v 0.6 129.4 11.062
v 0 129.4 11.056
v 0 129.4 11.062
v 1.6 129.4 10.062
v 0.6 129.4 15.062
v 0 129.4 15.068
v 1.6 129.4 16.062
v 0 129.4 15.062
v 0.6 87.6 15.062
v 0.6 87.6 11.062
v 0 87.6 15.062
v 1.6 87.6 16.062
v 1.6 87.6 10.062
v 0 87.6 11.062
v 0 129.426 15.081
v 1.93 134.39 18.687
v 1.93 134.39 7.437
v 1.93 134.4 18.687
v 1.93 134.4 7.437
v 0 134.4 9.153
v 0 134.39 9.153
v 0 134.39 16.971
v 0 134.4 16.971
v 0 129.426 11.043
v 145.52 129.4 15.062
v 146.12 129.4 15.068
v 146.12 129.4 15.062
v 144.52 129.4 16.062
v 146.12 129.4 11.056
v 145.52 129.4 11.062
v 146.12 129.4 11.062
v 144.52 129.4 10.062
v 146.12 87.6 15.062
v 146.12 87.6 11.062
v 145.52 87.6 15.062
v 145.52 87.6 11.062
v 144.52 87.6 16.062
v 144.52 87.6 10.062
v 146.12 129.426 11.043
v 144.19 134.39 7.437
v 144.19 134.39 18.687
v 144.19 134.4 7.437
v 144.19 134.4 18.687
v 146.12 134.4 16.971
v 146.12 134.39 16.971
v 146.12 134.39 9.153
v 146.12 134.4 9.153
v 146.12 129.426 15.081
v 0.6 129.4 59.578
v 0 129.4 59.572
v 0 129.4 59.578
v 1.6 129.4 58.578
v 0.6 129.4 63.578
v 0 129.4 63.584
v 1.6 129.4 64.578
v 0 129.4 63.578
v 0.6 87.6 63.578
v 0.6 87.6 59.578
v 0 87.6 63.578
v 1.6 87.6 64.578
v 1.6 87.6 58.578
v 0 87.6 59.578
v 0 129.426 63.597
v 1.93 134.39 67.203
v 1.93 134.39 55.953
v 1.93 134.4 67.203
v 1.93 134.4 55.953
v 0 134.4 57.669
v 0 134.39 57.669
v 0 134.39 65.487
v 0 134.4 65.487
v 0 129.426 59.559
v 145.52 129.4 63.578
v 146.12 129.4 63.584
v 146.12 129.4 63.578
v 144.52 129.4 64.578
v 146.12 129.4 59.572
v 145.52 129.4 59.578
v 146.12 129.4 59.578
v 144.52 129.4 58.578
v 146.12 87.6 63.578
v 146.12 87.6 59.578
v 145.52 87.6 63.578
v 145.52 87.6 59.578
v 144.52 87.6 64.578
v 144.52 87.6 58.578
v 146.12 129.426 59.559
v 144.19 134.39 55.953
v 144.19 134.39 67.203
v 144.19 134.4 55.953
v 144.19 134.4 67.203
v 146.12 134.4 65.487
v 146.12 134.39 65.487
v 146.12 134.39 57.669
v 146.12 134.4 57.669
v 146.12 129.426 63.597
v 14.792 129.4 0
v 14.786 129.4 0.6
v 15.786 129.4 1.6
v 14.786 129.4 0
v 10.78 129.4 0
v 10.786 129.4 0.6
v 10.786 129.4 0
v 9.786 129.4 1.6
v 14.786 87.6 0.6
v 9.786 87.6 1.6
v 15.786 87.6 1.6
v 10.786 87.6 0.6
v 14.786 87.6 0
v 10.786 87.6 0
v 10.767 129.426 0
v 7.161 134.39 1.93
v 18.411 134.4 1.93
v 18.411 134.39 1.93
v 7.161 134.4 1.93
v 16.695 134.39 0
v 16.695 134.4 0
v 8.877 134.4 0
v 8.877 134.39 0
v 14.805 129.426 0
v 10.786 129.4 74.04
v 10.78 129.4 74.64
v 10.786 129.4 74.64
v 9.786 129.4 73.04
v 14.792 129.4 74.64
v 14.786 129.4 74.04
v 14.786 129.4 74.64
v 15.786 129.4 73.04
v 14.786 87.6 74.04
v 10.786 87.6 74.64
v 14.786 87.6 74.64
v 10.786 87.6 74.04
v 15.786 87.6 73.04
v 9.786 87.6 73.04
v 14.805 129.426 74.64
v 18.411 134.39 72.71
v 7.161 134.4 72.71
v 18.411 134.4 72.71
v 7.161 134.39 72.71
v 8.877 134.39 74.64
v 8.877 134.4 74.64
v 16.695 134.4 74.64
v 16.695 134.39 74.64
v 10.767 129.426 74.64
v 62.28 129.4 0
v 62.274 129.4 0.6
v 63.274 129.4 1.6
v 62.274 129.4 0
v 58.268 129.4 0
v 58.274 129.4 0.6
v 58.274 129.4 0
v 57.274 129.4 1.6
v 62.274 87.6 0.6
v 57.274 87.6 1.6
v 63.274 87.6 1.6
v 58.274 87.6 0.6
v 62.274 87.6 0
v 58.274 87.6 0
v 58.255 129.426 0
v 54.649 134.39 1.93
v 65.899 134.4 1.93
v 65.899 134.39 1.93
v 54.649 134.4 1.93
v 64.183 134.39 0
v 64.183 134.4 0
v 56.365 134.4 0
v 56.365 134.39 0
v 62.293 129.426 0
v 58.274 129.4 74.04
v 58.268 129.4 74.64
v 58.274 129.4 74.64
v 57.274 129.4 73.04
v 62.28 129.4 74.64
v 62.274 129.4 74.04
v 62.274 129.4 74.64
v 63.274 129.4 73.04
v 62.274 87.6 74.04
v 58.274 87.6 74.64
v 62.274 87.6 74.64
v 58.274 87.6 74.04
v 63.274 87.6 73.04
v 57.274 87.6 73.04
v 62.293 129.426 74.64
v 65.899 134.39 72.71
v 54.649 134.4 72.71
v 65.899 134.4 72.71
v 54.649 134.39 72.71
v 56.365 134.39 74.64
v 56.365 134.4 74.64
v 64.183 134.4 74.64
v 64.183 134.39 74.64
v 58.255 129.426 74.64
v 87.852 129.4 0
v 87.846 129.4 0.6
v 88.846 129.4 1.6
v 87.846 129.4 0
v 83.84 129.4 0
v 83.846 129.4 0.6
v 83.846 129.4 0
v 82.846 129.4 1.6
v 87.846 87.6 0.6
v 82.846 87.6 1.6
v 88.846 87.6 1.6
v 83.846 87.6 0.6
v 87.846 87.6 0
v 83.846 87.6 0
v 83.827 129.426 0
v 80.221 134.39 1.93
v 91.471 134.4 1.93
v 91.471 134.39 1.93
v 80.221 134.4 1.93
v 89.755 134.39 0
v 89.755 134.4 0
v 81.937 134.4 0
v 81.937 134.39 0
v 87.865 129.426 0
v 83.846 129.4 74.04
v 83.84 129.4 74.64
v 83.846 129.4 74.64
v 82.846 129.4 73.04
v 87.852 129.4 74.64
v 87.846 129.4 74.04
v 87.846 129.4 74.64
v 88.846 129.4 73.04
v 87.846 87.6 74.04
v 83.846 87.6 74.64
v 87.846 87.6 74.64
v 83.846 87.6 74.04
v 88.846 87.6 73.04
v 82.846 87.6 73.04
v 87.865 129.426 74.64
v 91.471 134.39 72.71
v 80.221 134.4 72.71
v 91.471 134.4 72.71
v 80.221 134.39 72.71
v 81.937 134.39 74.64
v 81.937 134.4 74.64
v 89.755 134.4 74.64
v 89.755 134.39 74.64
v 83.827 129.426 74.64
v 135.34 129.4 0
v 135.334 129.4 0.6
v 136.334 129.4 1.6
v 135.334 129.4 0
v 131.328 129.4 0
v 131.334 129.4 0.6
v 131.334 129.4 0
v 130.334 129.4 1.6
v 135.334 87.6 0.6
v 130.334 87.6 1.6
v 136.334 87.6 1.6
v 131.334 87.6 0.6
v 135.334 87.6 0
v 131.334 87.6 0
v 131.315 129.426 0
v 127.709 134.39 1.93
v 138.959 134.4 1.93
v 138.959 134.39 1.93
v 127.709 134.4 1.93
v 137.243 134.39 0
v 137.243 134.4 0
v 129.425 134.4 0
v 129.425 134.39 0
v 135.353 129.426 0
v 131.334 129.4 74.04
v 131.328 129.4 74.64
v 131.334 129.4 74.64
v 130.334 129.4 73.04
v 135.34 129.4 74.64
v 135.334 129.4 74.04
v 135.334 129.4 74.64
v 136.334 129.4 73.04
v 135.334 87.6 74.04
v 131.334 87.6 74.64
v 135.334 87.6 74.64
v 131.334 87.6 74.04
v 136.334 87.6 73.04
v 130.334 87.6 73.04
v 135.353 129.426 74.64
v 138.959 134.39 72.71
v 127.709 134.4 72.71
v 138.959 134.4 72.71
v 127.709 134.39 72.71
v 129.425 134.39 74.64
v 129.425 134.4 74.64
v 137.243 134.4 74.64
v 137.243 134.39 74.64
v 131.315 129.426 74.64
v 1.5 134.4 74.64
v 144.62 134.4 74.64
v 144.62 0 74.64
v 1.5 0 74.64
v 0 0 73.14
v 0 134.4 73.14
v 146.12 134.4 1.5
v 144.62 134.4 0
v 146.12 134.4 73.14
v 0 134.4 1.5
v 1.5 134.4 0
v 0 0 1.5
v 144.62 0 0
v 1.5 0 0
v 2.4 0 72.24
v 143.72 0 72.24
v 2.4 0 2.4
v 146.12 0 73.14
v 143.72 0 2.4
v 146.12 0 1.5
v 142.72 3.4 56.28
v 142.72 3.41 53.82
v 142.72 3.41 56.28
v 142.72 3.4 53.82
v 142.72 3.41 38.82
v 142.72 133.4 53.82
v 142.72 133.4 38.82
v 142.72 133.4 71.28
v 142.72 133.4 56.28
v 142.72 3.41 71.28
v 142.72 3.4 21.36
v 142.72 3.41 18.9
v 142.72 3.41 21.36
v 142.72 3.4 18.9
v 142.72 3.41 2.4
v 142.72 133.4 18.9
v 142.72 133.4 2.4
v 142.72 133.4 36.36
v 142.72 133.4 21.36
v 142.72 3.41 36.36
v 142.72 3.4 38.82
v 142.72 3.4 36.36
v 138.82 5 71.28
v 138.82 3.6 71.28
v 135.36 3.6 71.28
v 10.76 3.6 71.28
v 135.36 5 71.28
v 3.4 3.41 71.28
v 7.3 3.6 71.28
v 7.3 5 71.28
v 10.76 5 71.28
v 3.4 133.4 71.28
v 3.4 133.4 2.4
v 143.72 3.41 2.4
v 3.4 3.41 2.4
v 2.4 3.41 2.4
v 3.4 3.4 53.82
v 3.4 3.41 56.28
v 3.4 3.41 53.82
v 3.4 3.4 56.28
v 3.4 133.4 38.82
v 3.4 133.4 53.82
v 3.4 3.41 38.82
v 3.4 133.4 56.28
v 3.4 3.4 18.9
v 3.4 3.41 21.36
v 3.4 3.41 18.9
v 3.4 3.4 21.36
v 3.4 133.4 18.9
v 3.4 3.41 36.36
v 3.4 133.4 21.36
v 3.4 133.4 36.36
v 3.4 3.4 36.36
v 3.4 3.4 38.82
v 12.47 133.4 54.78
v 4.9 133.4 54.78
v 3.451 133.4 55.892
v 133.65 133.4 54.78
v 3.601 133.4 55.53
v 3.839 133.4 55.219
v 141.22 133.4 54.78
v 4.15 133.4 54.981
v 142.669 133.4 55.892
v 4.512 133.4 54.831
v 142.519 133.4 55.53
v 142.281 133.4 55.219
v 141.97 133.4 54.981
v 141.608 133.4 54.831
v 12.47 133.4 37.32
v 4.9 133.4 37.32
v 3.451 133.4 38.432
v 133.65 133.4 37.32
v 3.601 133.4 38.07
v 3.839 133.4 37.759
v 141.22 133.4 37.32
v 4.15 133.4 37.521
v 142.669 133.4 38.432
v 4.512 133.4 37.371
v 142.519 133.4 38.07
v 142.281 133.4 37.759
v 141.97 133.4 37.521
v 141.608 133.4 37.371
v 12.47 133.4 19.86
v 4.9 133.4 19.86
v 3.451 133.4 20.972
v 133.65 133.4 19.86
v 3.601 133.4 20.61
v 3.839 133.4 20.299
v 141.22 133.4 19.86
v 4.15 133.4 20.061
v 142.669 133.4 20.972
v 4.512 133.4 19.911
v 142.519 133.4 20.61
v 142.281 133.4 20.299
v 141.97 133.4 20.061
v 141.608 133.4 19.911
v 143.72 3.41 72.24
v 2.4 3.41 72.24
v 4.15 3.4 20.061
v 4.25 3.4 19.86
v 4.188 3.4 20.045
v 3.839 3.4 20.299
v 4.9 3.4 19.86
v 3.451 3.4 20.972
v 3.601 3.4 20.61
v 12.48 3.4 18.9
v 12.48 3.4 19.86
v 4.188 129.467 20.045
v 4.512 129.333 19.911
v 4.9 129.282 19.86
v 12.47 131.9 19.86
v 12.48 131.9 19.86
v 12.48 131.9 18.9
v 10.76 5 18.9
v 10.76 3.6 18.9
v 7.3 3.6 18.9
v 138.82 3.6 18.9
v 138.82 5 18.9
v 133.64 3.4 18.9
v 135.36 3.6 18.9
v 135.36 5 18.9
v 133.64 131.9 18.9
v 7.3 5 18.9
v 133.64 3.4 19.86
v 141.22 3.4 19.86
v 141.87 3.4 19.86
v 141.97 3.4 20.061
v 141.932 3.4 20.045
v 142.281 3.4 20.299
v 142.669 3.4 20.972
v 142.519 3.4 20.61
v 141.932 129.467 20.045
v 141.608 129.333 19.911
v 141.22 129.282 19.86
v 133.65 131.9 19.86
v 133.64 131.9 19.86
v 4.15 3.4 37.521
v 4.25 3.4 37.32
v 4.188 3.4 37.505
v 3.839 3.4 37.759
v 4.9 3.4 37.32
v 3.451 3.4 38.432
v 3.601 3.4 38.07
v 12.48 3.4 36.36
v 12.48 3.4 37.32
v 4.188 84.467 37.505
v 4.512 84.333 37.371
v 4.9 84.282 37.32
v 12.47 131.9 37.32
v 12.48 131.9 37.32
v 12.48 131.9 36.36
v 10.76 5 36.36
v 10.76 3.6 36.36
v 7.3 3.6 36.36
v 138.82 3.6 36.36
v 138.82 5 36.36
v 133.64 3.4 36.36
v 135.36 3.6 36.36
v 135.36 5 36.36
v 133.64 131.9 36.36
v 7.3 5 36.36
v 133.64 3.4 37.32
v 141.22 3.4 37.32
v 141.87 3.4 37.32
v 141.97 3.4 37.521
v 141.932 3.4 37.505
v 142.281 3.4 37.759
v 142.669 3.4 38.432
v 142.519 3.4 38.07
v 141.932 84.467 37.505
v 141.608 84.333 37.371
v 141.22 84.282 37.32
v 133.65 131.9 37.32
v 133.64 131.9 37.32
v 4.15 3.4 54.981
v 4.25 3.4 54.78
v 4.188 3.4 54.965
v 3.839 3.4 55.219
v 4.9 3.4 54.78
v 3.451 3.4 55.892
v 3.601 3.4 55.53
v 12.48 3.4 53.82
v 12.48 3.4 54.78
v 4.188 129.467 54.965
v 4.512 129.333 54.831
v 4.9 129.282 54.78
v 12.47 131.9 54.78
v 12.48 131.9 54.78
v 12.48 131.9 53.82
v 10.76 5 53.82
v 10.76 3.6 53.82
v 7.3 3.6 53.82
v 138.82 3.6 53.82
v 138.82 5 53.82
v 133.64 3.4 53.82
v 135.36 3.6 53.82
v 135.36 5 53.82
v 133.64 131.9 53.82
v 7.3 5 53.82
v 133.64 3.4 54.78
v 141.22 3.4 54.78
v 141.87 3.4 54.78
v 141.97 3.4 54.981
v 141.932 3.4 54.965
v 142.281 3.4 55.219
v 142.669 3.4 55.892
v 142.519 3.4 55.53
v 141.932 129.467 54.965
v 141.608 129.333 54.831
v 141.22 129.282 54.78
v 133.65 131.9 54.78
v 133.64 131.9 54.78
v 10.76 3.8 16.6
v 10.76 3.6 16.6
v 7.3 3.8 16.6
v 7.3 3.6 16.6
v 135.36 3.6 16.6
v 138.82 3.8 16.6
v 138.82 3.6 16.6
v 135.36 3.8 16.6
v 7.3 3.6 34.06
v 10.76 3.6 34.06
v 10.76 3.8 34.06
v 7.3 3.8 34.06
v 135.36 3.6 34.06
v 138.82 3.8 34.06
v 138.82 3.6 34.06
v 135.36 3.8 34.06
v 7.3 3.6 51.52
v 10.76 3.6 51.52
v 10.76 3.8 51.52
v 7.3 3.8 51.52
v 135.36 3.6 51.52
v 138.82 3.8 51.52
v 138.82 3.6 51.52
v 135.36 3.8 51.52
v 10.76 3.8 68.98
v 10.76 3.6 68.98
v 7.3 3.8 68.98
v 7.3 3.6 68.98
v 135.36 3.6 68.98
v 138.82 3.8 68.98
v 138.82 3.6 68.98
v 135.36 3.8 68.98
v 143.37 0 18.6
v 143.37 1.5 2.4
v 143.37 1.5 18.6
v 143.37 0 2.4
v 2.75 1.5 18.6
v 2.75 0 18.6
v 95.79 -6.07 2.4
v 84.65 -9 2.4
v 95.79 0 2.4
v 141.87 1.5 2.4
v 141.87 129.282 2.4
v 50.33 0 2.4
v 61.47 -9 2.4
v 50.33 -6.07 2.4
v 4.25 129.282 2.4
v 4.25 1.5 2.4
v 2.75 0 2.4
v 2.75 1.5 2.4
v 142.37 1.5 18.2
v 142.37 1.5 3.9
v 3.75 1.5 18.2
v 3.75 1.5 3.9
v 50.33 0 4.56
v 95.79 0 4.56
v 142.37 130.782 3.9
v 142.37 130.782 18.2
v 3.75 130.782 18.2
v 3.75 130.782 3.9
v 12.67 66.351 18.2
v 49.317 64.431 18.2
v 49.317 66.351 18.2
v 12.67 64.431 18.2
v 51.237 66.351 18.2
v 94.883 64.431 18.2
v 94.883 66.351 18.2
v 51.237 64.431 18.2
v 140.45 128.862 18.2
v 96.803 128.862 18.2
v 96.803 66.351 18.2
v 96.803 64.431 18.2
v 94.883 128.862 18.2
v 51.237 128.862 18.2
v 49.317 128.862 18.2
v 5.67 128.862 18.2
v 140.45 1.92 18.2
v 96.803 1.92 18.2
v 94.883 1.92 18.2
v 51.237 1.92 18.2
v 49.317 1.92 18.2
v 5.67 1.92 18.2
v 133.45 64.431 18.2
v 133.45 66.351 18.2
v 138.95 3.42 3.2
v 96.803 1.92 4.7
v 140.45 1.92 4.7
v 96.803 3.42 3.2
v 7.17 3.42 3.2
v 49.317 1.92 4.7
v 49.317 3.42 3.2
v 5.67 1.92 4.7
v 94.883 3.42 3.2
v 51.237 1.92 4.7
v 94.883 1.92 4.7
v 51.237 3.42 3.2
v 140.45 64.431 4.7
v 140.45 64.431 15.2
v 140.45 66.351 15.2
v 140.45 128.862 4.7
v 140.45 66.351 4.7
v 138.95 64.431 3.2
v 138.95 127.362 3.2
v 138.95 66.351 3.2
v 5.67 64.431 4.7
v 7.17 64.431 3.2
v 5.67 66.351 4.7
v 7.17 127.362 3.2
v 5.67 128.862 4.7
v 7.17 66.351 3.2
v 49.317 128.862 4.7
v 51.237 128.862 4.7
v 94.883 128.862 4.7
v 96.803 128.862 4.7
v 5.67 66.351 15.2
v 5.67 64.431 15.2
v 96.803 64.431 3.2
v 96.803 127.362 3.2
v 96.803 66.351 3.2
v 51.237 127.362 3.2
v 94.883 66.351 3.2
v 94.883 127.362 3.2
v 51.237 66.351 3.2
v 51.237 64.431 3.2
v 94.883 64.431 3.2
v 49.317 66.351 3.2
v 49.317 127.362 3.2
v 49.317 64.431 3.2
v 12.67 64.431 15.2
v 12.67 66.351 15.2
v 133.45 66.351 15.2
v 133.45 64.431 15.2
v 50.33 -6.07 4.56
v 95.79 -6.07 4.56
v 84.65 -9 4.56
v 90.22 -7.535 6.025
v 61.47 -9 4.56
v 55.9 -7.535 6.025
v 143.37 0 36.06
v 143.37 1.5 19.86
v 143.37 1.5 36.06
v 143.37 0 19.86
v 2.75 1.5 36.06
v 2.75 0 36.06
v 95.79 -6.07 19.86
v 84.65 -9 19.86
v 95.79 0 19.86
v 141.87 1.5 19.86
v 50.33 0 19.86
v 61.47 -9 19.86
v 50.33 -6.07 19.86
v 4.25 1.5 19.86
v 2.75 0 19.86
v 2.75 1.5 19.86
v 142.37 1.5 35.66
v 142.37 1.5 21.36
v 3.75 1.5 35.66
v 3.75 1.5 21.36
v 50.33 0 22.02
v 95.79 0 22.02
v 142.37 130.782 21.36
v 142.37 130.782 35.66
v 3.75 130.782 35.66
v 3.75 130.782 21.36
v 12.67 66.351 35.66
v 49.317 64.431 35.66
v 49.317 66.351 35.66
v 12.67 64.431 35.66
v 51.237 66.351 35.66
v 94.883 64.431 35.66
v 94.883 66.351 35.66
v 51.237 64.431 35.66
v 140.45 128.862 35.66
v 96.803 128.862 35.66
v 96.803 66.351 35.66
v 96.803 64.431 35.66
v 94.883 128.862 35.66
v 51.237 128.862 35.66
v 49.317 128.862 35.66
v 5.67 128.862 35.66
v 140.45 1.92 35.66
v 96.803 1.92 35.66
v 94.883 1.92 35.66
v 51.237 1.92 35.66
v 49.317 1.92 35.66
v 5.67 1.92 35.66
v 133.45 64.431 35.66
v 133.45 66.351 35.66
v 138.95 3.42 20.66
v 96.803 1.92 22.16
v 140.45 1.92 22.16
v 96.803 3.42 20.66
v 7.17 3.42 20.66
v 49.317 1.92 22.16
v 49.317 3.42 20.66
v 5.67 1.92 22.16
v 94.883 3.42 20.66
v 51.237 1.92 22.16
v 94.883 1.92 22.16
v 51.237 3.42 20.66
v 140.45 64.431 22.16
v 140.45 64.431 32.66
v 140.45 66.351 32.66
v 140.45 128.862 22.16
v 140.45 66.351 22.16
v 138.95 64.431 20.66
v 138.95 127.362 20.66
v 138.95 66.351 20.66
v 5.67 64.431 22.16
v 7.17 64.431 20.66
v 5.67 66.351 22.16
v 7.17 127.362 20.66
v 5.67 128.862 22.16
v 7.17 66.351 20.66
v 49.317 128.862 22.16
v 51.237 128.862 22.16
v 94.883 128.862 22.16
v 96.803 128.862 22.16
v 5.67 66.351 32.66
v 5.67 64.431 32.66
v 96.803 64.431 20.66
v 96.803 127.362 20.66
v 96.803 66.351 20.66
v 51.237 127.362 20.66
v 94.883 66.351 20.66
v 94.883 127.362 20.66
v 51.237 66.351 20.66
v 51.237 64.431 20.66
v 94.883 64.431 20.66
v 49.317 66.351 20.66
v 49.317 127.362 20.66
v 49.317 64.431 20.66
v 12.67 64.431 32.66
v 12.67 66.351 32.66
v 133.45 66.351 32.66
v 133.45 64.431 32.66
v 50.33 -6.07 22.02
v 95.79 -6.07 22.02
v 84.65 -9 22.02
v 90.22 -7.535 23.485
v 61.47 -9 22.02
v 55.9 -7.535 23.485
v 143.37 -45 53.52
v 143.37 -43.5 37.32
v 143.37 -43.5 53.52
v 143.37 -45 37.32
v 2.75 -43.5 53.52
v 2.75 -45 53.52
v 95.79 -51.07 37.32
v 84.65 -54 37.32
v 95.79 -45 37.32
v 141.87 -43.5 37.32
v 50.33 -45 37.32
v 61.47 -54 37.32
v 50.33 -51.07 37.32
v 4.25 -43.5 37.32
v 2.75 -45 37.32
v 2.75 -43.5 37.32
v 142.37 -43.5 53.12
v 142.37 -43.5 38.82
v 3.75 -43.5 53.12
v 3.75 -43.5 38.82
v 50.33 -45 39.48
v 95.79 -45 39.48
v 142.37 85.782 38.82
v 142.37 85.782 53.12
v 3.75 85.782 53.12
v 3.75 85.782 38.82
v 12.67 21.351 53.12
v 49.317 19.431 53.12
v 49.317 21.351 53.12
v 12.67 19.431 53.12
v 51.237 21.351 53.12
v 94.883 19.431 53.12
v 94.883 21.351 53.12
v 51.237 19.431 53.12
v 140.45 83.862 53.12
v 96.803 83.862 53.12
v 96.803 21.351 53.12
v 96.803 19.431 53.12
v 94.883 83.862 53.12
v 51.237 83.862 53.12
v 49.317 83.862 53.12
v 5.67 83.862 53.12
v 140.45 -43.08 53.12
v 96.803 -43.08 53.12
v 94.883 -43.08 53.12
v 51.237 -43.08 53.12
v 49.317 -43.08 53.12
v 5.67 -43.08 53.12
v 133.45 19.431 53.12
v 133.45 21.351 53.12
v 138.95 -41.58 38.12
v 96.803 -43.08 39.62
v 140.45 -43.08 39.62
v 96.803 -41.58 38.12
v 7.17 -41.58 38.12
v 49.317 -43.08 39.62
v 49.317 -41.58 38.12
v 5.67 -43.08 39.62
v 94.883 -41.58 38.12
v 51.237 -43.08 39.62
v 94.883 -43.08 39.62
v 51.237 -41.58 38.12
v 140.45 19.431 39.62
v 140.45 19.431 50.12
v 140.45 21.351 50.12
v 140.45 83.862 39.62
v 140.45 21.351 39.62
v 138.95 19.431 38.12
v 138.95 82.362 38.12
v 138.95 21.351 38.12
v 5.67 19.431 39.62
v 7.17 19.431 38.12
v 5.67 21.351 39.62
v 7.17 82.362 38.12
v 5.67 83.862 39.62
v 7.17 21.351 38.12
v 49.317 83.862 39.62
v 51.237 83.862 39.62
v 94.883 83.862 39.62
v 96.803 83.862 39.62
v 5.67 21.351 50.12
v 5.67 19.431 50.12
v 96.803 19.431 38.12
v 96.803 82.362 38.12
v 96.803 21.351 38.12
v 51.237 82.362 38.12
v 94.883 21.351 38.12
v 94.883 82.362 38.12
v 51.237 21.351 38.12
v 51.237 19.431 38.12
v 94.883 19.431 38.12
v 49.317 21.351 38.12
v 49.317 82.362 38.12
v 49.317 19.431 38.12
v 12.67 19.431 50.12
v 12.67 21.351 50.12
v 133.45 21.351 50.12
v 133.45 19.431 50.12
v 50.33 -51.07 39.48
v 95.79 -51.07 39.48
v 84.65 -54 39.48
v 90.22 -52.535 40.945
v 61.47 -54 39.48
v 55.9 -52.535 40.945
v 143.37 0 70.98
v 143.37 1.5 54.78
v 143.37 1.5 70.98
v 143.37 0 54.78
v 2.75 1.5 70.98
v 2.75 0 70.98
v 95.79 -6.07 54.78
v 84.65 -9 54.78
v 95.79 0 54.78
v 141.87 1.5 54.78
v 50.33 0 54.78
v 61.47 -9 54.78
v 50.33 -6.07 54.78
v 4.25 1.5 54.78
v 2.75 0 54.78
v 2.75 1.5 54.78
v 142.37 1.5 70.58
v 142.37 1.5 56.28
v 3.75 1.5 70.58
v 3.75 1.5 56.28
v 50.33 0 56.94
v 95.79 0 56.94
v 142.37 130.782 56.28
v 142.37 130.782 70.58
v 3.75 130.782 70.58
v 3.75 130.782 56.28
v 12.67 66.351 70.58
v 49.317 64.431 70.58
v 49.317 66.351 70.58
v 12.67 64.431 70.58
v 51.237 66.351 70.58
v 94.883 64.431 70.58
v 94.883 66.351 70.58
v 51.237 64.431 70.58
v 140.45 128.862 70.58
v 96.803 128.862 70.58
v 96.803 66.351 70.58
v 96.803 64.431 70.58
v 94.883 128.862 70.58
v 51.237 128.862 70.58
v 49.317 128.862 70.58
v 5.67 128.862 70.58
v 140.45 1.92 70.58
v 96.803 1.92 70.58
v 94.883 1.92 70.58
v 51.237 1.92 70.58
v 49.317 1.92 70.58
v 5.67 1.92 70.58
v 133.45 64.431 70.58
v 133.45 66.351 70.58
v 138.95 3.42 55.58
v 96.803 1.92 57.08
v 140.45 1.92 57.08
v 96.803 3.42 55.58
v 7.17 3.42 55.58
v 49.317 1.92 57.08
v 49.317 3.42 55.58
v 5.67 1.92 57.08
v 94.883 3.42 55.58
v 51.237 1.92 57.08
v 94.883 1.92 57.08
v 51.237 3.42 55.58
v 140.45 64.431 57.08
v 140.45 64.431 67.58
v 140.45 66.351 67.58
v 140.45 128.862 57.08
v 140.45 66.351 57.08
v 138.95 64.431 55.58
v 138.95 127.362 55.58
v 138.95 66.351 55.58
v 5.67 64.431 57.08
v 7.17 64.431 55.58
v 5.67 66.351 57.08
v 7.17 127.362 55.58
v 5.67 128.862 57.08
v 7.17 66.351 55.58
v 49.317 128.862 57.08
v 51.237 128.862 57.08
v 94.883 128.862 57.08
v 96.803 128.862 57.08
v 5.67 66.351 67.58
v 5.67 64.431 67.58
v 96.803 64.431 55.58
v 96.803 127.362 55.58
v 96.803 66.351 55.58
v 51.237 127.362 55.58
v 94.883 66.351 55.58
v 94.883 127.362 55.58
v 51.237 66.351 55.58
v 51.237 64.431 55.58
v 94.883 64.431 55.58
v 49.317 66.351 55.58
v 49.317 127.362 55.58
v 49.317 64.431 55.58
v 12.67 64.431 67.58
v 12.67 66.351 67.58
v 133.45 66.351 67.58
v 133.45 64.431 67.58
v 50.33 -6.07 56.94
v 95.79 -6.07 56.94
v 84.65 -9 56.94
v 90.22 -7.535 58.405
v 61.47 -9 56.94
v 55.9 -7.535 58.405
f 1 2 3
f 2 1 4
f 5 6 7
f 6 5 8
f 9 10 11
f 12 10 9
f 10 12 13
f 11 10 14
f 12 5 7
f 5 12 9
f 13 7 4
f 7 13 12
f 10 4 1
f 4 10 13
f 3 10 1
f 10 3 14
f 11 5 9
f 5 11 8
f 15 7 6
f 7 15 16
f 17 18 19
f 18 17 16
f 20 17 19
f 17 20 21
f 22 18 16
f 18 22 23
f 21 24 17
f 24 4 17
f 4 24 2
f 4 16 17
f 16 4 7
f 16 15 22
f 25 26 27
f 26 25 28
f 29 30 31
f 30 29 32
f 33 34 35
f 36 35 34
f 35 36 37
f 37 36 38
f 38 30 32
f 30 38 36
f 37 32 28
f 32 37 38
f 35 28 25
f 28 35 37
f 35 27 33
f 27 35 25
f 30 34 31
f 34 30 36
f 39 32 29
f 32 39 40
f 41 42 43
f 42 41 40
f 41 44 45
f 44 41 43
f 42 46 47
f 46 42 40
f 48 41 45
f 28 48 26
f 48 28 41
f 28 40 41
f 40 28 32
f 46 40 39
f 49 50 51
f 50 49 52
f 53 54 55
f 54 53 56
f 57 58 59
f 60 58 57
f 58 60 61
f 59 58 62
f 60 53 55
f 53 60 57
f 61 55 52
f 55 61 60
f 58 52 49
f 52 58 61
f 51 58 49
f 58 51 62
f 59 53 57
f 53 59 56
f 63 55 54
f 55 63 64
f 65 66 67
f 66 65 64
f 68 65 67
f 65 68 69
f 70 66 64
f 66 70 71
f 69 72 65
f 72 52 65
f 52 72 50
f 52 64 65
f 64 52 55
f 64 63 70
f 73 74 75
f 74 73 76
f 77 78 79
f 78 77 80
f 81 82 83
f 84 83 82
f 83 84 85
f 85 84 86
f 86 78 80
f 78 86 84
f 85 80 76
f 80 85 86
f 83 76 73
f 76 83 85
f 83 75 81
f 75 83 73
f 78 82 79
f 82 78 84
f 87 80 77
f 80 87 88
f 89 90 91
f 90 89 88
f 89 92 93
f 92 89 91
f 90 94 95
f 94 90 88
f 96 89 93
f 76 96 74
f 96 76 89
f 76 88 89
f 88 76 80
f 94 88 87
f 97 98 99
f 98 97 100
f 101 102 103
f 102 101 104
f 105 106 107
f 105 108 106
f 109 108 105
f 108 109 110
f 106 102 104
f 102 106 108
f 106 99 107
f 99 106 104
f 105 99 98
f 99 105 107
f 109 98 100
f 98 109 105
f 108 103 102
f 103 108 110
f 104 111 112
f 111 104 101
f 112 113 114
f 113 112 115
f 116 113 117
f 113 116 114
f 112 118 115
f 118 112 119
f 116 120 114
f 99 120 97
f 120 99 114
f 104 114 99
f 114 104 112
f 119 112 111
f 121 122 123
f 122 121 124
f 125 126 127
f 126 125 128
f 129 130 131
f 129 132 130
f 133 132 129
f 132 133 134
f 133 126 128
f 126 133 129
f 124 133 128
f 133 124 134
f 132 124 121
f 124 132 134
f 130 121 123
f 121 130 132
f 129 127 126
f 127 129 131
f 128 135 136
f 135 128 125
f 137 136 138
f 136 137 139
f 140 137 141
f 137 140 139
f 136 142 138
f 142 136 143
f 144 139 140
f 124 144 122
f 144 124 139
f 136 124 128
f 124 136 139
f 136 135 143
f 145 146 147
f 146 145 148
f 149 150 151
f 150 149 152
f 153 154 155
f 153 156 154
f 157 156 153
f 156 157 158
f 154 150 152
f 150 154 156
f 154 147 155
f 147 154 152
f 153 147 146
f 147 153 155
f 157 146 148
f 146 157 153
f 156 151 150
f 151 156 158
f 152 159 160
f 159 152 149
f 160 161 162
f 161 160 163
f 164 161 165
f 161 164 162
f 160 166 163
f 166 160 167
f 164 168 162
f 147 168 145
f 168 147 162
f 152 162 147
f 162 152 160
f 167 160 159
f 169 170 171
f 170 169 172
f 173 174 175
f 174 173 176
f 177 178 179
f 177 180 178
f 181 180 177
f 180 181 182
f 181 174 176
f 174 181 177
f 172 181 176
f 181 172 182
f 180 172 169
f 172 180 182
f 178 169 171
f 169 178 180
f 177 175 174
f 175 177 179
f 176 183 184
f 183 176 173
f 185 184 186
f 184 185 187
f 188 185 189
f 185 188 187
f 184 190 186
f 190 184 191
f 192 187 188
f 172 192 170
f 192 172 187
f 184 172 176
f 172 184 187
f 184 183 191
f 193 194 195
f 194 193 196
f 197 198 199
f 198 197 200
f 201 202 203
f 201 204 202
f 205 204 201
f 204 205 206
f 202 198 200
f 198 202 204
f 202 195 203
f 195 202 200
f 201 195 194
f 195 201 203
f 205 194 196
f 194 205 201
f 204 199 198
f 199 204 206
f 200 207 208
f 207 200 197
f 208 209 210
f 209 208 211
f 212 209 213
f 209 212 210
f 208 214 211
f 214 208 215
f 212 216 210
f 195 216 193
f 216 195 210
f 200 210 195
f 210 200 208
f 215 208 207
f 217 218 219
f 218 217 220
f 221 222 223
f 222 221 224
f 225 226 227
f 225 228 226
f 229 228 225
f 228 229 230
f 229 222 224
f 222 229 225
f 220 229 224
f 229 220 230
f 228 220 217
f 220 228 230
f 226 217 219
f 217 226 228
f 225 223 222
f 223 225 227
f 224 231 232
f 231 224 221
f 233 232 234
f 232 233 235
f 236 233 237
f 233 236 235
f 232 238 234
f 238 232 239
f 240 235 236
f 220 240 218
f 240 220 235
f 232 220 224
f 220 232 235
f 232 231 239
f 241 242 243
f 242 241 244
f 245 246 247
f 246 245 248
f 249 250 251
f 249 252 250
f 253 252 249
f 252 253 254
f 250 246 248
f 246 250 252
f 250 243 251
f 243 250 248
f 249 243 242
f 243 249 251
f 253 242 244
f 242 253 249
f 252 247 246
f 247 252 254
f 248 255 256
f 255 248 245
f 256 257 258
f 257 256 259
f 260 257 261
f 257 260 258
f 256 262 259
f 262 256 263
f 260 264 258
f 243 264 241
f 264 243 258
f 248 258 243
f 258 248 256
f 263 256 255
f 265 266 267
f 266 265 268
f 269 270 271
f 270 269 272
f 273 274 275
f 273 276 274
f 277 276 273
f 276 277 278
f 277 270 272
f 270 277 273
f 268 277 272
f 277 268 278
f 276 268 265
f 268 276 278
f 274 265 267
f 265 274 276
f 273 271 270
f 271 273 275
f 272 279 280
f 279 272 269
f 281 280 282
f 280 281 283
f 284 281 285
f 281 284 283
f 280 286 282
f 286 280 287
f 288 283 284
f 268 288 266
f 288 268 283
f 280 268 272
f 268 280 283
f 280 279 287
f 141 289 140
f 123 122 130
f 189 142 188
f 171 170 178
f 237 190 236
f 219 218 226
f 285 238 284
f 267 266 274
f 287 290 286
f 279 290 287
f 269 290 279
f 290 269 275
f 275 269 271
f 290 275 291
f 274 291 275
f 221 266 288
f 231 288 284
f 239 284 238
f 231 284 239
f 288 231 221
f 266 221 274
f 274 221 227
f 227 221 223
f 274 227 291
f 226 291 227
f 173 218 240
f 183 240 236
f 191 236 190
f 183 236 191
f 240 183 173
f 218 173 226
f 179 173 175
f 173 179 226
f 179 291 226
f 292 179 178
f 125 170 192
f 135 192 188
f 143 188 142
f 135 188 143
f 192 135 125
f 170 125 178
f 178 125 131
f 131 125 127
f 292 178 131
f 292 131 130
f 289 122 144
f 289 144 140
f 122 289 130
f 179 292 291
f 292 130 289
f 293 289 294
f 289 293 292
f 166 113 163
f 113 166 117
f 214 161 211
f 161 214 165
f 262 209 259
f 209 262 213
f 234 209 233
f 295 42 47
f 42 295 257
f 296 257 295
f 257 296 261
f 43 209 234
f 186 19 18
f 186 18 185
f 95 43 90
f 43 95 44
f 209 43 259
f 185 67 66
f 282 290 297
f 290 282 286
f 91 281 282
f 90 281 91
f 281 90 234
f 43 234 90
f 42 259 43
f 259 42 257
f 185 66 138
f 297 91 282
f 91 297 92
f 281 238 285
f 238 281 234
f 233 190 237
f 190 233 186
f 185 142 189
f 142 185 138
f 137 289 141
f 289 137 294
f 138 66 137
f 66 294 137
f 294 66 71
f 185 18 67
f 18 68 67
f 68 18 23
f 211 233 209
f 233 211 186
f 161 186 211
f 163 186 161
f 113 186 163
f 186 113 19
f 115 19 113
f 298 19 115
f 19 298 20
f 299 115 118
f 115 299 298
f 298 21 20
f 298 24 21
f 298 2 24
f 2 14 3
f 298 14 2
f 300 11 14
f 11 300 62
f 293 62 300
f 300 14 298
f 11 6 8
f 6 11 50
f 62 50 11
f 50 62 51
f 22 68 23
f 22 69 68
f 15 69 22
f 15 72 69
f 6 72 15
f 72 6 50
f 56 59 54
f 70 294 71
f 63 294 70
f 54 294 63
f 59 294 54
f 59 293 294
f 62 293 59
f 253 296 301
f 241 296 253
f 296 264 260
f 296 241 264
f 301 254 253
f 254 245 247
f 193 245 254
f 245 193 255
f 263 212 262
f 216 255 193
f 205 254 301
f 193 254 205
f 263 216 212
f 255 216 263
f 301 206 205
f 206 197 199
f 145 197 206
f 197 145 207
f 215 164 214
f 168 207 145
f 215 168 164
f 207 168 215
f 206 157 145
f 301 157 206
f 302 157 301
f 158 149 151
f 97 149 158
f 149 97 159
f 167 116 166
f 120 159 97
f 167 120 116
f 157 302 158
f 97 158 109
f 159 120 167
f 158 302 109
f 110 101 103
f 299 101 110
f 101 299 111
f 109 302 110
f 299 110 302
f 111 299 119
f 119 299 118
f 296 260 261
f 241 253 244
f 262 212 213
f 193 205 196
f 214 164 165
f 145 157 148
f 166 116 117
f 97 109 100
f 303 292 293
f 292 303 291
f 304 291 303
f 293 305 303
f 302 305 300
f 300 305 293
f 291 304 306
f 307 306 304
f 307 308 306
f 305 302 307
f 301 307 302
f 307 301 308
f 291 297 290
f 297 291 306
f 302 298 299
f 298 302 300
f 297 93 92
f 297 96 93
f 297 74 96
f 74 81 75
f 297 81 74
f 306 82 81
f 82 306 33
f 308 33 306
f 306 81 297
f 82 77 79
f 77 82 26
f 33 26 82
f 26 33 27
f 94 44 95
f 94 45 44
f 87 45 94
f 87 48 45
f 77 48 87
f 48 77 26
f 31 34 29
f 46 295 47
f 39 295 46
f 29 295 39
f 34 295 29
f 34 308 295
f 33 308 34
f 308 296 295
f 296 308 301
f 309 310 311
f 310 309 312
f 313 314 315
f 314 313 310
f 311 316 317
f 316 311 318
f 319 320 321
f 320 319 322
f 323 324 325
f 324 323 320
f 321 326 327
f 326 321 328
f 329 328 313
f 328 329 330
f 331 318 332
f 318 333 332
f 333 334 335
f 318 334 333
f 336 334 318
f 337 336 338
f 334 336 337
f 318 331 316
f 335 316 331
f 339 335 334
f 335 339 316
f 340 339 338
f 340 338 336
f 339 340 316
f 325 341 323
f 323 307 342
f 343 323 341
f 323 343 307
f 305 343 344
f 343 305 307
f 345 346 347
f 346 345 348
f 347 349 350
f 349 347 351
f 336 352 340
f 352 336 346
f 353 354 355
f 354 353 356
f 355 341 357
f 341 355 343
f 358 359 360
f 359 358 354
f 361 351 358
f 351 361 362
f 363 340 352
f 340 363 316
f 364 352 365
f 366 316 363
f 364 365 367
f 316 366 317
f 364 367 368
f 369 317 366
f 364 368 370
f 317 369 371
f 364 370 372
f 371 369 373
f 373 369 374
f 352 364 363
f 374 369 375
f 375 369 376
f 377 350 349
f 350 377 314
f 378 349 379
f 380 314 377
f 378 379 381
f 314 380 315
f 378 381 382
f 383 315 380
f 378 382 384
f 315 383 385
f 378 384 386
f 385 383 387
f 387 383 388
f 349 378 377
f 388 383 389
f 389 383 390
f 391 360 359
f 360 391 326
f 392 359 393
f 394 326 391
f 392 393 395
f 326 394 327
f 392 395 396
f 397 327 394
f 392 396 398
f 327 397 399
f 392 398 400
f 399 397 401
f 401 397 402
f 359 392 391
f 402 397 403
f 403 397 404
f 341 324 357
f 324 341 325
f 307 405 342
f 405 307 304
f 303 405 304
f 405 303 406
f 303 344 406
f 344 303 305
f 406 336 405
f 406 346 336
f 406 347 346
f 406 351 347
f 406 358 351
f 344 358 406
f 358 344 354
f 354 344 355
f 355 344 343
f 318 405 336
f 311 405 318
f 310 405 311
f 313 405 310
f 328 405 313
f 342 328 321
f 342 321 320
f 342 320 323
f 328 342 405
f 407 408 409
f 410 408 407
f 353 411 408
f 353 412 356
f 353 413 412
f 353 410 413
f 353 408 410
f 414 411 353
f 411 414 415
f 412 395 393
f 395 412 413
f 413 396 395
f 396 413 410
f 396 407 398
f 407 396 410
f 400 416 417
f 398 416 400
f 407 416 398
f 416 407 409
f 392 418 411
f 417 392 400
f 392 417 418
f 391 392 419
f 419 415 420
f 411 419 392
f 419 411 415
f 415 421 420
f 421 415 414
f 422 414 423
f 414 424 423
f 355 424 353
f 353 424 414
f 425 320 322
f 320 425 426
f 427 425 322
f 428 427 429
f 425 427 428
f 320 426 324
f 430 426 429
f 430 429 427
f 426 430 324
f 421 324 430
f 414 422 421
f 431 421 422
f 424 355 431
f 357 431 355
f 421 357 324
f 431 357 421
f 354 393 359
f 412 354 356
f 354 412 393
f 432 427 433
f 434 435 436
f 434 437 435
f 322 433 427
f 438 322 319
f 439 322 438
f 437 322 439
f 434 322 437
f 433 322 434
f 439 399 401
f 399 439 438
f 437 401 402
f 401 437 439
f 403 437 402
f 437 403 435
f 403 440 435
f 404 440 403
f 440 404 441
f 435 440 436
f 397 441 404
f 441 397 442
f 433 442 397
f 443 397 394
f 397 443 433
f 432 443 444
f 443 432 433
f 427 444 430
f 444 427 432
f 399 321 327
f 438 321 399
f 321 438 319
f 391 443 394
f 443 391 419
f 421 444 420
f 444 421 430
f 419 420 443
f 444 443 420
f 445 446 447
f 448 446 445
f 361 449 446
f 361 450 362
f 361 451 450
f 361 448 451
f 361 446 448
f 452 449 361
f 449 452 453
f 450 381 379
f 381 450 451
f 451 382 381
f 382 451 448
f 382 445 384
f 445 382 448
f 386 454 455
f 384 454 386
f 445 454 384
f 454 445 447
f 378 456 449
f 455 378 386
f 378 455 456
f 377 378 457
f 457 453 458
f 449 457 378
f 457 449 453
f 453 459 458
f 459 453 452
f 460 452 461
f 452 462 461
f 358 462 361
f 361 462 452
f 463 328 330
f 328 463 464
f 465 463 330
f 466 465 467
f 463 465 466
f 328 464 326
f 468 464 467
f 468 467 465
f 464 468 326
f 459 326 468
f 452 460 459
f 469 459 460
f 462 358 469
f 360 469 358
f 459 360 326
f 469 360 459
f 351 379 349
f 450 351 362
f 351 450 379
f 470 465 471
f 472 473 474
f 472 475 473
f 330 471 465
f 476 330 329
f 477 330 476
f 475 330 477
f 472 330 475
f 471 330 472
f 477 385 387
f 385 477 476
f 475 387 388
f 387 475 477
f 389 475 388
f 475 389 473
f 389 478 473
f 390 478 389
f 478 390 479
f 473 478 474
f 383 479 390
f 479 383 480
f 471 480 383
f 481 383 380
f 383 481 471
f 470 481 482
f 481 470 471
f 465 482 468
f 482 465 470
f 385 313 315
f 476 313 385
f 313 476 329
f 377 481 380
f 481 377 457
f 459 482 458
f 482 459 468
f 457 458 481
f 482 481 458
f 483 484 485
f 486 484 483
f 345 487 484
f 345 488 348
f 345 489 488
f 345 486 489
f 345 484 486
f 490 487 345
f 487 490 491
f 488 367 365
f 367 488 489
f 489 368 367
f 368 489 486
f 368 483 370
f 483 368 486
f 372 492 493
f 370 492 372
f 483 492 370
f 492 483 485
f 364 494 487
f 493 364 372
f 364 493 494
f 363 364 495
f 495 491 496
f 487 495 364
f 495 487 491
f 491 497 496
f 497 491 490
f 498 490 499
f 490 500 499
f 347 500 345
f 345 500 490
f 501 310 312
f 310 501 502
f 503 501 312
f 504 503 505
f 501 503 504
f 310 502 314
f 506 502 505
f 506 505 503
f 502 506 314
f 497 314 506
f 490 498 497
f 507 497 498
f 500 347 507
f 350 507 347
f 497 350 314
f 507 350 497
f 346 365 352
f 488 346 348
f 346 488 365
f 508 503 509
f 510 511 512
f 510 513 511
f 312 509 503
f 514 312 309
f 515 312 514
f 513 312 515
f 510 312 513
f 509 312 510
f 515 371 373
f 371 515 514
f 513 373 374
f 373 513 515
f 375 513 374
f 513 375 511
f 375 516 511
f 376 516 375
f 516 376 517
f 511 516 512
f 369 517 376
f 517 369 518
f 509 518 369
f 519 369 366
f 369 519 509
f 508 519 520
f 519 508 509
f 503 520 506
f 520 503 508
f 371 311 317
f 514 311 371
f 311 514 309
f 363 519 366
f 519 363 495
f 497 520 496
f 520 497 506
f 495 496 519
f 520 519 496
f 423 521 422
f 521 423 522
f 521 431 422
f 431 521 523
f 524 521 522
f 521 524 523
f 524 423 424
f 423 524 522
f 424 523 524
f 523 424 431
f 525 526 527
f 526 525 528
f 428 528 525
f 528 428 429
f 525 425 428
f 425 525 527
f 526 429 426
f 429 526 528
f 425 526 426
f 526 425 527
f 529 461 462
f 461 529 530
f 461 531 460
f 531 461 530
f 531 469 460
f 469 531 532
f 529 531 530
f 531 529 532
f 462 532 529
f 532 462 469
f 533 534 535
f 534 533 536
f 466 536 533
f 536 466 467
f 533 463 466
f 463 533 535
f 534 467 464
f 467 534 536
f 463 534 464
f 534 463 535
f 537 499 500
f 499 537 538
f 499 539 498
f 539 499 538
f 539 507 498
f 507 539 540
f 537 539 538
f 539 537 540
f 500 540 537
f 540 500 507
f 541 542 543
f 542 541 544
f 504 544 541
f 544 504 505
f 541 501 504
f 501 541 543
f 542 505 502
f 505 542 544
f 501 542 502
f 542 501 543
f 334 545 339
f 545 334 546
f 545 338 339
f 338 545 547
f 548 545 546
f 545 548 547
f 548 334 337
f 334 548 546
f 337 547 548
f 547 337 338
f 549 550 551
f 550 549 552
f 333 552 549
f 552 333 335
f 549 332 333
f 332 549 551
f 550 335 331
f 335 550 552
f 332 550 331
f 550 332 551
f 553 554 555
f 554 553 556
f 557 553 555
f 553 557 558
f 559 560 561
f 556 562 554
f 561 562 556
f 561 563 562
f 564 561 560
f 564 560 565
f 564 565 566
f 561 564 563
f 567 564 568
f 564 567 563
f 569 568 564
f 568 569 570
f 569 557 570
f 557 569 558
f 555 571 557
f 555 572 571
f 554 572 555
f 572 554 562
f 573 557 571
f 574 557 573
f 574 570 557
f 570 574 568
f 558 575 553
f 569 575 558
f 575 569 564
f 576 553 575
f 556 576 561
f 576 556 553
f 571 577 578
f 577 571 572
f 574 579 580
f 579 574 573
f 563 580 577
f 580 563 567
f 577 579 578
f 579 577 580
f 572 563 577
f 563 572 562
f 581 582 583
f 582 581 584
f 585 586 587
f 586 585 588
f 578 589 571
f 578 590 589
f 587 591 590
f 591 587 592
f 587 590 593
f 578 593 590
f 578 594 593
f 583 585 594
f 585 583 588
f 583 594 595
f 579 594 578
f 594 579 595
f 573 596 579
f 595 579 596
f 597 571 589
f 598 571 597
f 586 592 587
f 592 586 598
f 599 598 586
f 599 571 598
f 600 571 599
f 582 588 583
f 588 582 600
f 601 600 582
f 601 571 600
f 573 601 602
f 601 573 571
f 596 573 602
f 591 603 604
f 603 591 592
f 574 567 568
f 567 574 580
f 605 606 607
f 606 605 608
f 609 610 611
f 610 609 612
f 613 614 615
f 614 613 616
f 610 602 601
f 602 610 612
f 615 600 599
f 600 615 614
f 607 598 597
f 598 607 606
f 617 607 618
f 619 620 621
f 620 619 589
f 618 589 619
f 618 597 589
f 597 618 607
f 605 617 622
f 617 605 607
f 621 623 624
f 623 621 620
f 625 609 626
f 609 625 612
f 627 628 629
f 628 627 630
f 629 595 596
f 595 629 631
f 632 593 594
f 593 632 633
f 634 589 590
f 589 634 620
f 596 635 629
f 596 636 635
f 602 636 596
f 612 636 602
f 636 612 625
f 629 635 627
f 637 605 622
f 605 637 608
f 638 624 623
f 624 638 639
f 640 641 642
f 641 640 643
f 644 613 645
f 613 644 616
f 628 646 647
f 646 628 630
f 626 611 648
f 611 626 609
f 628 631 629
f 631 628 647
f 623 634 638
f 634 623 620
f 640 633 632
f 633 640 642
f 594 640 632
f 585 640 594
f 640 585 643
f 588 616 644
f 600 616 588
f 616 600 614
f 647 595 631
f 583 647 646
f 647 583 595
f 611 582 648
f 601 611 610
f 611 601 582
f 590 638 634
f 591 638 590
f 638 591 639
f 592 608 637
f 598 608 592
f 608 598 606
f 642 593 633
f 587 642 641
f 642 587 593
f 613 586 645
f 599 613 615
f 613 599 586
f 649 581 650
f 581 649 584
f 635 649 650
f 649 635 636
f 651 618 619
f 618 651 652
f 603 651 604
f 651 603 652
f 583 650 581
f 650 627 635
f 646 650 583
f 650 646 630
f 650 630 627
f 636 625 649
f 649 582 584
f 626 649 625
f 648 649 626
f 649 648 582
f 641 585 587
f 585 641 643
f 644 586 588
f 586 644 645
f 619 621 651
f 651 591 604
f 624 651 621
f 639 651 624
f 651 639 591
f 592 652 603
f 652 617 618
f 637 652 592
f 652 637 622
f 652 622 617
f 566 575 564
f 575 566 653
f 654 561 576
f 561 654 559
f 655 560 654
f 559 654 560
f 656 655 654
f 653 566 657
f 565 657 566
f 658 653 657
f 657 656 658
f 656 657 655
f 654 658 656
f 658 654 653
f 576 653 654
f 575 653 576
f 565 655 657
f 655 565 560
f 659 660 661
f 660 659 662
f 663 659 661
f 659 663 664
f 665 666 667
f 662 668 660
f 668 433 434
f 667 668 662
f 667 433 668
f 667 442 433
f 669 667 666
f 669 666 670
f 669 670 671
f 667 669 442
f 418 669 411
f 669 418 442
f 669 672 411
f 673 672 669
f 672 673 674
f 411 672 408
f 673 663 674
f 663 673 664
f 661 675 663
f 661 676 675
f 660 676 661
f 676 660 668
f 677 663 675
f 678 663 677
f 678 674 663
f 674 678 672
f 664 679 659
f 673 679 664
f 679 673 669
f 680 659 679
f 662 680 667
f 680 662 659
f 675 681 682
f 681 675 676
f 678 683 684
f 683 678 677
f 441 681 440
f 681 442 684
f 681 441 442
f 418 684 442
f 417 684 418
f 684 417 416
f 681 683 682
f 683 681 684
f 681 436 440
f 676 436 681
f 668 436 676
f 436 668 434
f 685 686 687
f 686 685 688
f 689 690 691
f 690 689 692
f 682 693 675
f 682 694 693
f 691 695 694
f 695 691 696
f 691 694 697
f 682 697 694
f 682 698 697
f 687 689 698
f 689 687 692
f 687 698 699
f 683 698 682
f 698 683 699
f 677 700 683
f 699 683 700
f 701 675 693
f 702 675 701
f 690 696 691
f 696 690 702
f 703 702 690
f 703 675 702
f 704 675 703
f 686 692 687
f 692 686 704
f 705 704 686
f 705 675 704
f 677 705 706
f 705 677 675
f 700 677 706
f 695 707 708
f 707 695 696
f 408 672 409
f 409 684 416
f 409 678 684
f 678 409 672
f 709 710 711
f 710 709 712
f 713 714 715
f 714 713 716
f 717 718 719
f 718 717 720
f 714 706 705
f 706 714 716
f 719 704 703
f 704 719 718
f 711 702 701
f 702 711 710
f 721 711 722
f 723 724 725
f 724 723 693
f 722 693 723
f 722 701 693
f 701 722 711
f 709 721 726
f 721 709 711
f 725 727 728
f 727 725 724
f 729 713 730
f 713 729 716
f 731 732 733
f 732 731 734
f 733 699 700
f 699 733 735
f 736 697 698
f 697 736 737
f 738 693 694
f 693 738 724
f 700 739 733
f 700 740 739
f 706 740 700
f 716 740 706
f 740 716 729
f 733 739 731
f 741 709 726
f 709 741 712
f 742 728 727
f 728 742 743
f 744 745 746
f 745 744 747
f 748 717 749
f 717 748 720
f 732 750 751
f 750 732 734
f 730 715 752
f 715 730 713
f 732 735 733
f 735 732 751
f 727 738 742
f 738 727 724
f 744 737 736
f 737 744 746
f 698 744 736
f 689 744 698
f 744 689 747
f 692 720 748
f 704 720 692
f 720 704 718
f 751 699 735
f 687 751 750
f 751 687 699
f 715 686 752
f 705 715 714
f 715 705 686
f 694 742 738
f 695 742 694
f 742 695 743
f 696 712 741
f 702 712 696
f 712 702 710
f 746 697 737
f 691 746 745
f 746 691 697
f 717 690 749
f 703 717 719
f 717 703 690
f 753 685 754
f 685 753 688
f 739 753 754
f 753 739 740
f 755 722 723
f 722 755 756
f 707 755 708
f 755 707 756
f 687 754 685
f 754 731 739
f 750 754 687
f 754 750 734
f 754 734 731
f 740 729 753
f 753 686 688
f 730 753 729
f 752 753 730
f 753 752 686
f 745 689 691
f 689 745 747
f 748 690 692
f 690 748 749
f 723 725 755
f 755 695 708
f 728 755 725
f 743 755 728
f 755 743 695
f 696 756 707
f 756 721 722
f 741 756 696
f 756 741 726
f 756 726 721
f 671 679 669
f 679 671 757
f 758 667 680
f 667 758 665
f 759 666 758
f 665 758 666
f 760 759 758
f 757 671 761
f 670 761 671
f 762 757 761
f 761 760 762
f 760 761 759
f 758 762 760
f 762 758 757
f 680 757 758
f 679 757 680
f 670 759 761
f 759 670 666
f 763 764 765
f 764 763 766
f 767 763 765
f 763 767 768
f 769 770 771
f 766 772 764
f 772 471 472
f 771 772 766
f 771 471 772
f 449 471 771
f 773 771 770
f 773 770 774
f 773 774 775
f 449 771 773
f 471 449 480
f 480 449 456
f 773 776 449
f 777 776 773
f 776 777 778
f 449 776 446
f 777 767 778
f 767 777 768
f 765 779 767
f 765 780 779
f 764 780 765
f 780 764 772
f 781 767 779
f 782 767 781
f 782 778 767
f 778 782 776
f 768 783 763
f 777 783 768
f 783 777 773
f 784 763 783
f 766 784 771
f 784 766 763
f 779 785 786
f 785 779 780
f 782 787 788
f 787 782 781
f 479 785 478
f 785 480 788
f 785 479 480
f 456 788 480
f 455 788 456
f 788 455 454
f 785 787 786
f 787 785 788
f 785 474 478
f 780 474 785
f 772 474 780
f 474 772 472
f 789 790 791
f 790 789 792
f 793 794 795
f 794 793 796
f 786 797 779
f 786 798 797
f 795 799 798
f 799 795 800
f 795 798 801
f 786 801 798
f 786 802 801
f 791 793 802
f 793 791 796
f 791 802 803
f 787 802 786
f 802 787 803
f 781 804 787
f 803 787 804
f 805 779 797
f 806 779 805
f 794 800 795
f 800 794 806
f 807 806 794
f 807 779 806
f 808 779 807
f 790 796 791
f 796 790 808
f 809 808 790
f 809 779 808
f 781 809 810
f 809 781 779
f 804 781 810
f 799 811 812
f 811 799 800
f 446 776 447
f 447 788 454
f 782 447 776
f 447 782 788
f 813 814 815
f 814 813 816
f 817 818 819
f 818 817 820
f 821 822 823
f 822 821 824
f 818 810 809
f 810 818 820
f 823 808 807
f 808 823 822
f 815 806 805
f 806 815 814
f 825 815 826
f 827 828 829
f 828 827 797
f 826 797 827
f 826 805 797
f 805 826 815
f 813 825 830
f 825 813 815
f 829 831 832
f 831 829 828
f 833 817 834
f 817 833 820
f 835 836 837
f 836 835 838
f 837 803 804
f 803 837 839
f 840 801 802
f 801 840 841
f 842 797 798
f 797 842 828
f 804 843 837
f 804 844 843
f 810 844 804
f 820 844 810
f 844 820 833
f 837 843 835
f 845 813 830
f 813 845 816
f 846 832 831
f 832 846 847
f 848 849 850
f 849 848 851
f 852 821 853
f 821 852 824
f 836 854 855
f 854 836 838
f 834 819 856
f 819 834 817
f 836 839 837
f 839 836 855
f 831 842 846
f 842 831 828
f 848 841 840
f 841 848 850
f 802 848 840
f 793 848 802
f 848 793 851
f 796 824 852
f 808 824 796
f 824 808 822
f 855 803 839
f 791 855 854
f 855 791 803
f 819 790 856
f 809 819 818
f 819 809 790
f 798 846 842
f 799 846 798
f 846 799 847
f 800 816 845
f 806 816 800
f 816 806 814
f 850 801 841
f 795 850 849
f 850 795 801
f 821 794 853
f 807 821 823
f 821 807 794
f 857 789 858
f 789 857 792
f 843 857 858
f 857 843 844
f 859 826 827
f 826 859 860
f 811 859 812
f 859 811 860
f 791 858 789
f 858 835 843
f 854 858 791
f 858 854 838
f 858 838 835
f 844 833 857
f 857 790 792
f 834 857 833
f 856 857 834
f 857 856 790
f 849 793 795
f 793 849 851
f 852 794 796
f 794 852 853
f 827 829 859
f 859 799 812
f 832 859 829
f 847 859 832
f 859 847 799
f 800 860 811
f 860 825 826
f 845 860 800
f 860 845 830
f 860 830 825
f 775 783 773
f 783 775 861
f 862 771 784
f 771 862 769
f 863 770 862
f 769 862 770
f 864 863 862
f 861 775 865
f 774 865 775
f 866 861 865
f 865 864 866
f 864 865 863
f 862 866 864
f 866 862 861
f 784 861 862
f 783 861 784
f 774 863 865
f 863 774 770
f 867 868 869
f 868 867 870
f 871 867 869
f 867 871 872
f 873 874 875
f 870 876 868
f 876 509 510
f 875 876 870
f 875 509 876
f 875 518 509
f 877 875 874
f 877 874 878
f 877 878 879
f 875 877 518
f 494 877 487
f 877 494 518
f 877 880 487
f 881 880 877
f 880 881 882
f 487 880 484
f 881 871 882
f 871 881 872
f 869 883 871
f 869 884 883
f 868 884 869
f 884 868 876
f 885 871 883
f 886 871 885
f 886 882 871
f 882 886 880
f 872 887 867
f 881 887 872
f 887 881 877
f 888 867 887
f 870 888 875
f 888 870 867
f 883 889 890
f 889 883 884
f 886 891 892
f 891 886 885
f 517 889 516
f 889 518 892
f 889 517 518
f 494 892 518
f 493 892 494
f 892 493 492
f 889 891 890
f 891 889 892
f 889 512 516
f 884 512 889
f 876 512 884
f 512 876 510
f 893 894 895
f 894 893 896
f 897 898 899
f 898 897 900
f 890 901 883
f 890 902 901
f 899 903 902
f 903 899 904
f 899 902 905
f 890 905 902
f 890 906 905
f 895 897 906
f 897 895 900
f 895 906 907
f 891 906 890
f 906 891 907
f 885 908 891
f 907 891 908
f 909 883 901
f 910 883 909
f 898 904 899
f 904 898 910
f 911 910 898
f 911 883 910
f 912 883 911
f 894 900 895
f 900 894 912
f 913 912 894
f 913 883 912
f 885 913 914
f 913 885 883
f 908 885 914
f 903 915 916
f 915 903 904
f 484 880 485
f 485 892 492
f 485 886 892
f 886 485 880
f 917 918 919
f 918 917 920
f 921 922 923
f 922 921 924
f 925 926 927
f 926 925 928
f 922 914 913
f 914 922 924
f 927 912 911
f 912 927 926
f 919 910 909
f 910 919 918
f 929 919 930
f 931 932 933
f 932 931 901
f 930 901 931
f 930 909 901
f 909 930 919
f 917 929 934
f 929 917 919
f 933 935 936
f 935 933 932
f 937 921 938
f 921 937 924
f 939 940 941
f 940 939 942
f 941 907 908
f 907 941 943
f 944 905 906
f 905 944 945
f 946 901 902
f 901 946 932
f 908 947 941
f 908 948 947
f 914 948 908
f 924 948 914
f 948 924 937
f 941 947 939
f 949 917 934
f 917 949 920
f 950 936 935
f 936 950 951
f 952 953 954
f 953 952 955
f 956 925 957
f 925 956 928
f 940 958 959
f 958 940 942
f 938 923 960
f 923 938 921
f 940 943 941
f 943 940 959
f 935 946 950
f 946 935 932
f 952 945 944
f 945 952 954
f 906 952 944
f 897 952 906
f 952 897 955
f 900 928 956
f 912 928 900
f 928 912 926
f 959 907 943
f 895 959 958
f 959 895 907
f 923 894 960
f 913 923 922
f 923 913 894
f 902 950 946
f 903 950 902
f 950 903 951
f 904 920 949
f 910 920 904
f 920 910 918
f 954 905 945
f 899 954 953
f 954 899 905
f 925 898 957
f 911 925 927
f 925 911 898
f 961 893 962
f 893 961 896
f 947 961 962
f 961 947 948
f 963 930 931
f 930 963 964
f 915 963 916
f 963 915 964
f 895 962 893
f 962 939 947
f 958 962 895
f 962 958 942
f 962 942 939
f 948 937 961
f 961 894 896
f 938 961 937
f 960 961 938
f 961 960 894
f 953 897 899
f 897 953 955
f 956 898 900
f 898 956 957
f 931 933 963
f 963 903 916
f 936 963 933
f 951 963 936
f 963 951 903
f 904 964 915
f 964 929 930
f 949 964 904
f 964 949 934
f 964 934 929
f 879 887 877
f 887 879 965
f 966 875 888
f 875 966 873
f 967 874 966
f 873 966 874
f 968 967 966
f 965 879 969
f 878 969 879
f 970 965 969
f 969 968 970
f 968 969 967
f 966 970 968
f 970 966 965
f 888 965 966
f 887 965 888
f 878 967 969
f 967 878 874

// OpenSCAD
// ═══════════════════════════════════════════════════════════════════════════
//  Parametric Stackable Organizer  —  OPEN THIS FILE
//
//  1. Open this file in OpenSCAD
//  2. Window → Customizer  (or edit the values below)
//  3. F5 preview · F6 render · F7 export STL
//
//  Derivative work, CC BY-NC. Original design by termlimit, based on STTrife:
//  https://www.thingiverse.com/thing:3873672
// ═══════════════════════════════════════════════════════════════════════════

include <organizer.scad>

/* [What to generate] */
// Part to build
part = "demo"; // [demo:Preview — box with drawers, box:Box with drawer slots, box_bin:Box with drawers and open bin, drawer:Drawer, connector:Connector clip, connector_tolerant:Connector clip (loose fit)]

/* [Size] */
// Width, in grid units of 73.06 mm
width_units = 2;   // [1, 2, 2.5, 3]
// Depth, in grid units of 67.20 mm
depth_units = 2;   // [1, 2]
// Height, in grid units of 74.64 mm (boxes only)
height_units = 1;  // [1, 2, 3, 4]

/* [Drawer slots in the box] */
// How many drawer slots the box has in total. Drawer height follows
// automatically: 4 slots → 16.20 mm drawers, 2 → 33.66 mm, 1 → 68.58 mm
// (for a box one unit tall).
drawer_slots = 4;  // [1:1:8]
// Drawer height in mm. Leave 0 to derive it from the slot count (recommended).
drawer_height_mm = 0;

/* [Drawer] */
// Number of compartments across the width
compartments_across = 3;  // [1:1:8]
// Number of compartments front to back
compartments_deep = 2;    // [1:1:6]
// Divider thickness in mm. 1.92 gives sturdy dividers; 1.20 is slimmer and
// leaves more usable space when you want many compartments.
divider_thickness = 1.92;
// Pull handle under the drawer front
handle = true;
// For compartments that are NOT all the same, leave the two settings above
// alone and edit `drawer_layout` further down this file — the Customizer
// cannot show a list of lists, so it lives in the text.


/* [Connector slots] */
// Put slots on every grid unit, so any box can clip anywhere on the grid.
// Turn off for slots only along the outer edges.
slots_on_every_unit = true;
// Slot length in mm. Leave 0 for the standard 46.80 mm measured from the back.
slot_length_mm = 0;

/* [Open bin] */
// Bin height in mm, measured from the bin floor to the top of the box.
// 0 = half the box height, which gives a balanced split.
// Ignored when the bin has no drawers below it — then it fills the whole box.
bin_height = 0;
// Drawer slots below the bin. 0 = bin only, no drawers and no shelf.
bin_drawer_slots = 2;  // [0:1:6]
// Height of the front lip that keeps the contents in. Trimmed automatically
// if it would not fit the bin.
bin_lip_height = 28.56;
// Bin front panel flush with the face of the box.
// Turn off to recess it behind the front frame.
bin_front_flush = true;
// Roof over the back of the bin. Auto keeps it only when the box is deep
// enough to be useful — a one-unit-deep bin becomes an open shelf.
bin_roof = "auto"; // [auto, yes, no]

/* [Hidden] */
$fn = 64;

// ─── Compartments that are not a plain grid ─────────────────────────────────
// Leave empty to use compartments_across × compartments_deep above.
//
// Otherwise: one entry per column, front to back, written as
// [width weight, [row weights]]. The weights are relative and always fill the
// drawer, so [1,2,1] and [10,20,10] mean the same thing. A plain number is
// shorthand for a standard-width column with that many equal rows.
//
//   drawer_layout = [ [1, [1,1]],       // 2 equal rows
//                     [2, [1]],         // twice as wide, undivided
//                     [1, [1,2,1]] ];   // 3 rows, middle one twice as deep
//
//   drawer_layout = [2, 1, 3];          // 3 columns of 2, 1 and 3 rows
//
//   drawer_layout = [ [3, [1,1]], [1, [1,1,1,1]] ];
//                     // a wide half in 2 rows, a narrow half in 4
drawer_layout = [];

// Which way the layout is read:
//   "cols" — columns, each with its own rows   (the drawing above)
//   "rows" — bands across the drawer, each with its own columns; the first
//            weight is then the depth of the band
//
//   drawer_layout = [ [1,[1,1]], [1,[1]], [1,[1,1,1]] ];
//   drawer_layout_dir = "rows";   // 3 bands: 2 columns, none, 3 columns
drawer_layout_dir = "cols";

// Effective bin height: given, or half the box.
bin_height_eff = bin_height > 0 ? bin_height : height_units * UNIT_H / 2;

// Slot clearance and matching drawer height that follow from the slot count.
slot_clear_h = pocket_height_of(height_units, drawer_slots);
drawer_h     = drawer_height_mm > 0 ? drawer_height_mm
                                    : drawer_height_of(height_units, drawer_slots);

if (part == "demo" || part == "box" || part == "drawer")
    echo(str("drawer slots: ", drawer_slots, "   slot clearance: ", slot_clear_h,
             " mm   drawer height: ", drawer_h, " mm"));
if (part == "box_bin")
    echo(bin_drawer_slots > 0
         ? str("bin height ", bin_height_eff, " mm, with ", bin_drawer_slots,
               " drawer slots below")
         : str("bin only, fills the box — height ",
               height_units * UNIT_H - WALL_FLOOR,
               " mm (bin_height ignored)"));
// The module reports any further bin adjustments (trimmed lip, moved shelf).

// ─── Part selection ──────────────────────────────────────────────────────────
if (part == "box")
    box(width_units, depth_units, height_units, drawer_slots, true,
        slots_on_every_unit);
else if (part == "drawer")
    drawer(width_units, depth_units, cols = compartments_across,
           rows = compartments_deep, div_t = divider_thickness,
           h = drawer_h, handle = handle, layout = drawer_layout,
           layout_dir = drawer_layout_dir);
else if (part == "box_bin")
    box_drawer_bin(width_units, depth_units, height_units,
                   bin_drawer_slots > 0 ? 1 : 0,   // unused when shelf_z given
                   bin_drawer_slots,
                   slots_on_every_unit,
                   slot_length_mm > 0 ? slot_length_mm : undef,
                   true, bin_lip_height,
                   // Bin height converted to the shelf position. With no
                   // drawers there is no shelf — the bin sits on the floor.
                   bin_drawer_slots > 0
                       ? height_units * UNIT_H - bin_height_eff
                         - BIN_SHELF_BELOW - BIN_SHELF_ABOVE
                       : undef,
                   bin_front_flush,
                   bin_roof == "yes" ? true : bin_roof == "no" ? false : undef);
else if (part == "connector")            connector();
else if (part == "connector_tolerant")   connector(true);
else if (part == "demo")                 demo_box_with_drawers();

// Preview: a box filled with drawers, one pulled out.
module demo_box_with_drawers() {
    W = width_units * UNIT_L;
    box(width_units, depth_units, height_units, drawer_slots, true,
        slots_on_every_unit);
    out = floor(drawer_slots / 2);   // which drawer is pulled out
    for (i = [0 : drawer_slots - 1])
        translate([W/2, i == out ? -45 : 0,
                   WALL_FLOOR + i * (slot_clear_h + RAIL_T)])
            drawer(width_units, depth_units, h = drawer_h,
                   cols = compartments_across, rows = compartments_deep,
                   div_t = divider_thickness, handle = handle,
                   layout = drawer_layout, layout_dir = drawer_layout_dir);
}
